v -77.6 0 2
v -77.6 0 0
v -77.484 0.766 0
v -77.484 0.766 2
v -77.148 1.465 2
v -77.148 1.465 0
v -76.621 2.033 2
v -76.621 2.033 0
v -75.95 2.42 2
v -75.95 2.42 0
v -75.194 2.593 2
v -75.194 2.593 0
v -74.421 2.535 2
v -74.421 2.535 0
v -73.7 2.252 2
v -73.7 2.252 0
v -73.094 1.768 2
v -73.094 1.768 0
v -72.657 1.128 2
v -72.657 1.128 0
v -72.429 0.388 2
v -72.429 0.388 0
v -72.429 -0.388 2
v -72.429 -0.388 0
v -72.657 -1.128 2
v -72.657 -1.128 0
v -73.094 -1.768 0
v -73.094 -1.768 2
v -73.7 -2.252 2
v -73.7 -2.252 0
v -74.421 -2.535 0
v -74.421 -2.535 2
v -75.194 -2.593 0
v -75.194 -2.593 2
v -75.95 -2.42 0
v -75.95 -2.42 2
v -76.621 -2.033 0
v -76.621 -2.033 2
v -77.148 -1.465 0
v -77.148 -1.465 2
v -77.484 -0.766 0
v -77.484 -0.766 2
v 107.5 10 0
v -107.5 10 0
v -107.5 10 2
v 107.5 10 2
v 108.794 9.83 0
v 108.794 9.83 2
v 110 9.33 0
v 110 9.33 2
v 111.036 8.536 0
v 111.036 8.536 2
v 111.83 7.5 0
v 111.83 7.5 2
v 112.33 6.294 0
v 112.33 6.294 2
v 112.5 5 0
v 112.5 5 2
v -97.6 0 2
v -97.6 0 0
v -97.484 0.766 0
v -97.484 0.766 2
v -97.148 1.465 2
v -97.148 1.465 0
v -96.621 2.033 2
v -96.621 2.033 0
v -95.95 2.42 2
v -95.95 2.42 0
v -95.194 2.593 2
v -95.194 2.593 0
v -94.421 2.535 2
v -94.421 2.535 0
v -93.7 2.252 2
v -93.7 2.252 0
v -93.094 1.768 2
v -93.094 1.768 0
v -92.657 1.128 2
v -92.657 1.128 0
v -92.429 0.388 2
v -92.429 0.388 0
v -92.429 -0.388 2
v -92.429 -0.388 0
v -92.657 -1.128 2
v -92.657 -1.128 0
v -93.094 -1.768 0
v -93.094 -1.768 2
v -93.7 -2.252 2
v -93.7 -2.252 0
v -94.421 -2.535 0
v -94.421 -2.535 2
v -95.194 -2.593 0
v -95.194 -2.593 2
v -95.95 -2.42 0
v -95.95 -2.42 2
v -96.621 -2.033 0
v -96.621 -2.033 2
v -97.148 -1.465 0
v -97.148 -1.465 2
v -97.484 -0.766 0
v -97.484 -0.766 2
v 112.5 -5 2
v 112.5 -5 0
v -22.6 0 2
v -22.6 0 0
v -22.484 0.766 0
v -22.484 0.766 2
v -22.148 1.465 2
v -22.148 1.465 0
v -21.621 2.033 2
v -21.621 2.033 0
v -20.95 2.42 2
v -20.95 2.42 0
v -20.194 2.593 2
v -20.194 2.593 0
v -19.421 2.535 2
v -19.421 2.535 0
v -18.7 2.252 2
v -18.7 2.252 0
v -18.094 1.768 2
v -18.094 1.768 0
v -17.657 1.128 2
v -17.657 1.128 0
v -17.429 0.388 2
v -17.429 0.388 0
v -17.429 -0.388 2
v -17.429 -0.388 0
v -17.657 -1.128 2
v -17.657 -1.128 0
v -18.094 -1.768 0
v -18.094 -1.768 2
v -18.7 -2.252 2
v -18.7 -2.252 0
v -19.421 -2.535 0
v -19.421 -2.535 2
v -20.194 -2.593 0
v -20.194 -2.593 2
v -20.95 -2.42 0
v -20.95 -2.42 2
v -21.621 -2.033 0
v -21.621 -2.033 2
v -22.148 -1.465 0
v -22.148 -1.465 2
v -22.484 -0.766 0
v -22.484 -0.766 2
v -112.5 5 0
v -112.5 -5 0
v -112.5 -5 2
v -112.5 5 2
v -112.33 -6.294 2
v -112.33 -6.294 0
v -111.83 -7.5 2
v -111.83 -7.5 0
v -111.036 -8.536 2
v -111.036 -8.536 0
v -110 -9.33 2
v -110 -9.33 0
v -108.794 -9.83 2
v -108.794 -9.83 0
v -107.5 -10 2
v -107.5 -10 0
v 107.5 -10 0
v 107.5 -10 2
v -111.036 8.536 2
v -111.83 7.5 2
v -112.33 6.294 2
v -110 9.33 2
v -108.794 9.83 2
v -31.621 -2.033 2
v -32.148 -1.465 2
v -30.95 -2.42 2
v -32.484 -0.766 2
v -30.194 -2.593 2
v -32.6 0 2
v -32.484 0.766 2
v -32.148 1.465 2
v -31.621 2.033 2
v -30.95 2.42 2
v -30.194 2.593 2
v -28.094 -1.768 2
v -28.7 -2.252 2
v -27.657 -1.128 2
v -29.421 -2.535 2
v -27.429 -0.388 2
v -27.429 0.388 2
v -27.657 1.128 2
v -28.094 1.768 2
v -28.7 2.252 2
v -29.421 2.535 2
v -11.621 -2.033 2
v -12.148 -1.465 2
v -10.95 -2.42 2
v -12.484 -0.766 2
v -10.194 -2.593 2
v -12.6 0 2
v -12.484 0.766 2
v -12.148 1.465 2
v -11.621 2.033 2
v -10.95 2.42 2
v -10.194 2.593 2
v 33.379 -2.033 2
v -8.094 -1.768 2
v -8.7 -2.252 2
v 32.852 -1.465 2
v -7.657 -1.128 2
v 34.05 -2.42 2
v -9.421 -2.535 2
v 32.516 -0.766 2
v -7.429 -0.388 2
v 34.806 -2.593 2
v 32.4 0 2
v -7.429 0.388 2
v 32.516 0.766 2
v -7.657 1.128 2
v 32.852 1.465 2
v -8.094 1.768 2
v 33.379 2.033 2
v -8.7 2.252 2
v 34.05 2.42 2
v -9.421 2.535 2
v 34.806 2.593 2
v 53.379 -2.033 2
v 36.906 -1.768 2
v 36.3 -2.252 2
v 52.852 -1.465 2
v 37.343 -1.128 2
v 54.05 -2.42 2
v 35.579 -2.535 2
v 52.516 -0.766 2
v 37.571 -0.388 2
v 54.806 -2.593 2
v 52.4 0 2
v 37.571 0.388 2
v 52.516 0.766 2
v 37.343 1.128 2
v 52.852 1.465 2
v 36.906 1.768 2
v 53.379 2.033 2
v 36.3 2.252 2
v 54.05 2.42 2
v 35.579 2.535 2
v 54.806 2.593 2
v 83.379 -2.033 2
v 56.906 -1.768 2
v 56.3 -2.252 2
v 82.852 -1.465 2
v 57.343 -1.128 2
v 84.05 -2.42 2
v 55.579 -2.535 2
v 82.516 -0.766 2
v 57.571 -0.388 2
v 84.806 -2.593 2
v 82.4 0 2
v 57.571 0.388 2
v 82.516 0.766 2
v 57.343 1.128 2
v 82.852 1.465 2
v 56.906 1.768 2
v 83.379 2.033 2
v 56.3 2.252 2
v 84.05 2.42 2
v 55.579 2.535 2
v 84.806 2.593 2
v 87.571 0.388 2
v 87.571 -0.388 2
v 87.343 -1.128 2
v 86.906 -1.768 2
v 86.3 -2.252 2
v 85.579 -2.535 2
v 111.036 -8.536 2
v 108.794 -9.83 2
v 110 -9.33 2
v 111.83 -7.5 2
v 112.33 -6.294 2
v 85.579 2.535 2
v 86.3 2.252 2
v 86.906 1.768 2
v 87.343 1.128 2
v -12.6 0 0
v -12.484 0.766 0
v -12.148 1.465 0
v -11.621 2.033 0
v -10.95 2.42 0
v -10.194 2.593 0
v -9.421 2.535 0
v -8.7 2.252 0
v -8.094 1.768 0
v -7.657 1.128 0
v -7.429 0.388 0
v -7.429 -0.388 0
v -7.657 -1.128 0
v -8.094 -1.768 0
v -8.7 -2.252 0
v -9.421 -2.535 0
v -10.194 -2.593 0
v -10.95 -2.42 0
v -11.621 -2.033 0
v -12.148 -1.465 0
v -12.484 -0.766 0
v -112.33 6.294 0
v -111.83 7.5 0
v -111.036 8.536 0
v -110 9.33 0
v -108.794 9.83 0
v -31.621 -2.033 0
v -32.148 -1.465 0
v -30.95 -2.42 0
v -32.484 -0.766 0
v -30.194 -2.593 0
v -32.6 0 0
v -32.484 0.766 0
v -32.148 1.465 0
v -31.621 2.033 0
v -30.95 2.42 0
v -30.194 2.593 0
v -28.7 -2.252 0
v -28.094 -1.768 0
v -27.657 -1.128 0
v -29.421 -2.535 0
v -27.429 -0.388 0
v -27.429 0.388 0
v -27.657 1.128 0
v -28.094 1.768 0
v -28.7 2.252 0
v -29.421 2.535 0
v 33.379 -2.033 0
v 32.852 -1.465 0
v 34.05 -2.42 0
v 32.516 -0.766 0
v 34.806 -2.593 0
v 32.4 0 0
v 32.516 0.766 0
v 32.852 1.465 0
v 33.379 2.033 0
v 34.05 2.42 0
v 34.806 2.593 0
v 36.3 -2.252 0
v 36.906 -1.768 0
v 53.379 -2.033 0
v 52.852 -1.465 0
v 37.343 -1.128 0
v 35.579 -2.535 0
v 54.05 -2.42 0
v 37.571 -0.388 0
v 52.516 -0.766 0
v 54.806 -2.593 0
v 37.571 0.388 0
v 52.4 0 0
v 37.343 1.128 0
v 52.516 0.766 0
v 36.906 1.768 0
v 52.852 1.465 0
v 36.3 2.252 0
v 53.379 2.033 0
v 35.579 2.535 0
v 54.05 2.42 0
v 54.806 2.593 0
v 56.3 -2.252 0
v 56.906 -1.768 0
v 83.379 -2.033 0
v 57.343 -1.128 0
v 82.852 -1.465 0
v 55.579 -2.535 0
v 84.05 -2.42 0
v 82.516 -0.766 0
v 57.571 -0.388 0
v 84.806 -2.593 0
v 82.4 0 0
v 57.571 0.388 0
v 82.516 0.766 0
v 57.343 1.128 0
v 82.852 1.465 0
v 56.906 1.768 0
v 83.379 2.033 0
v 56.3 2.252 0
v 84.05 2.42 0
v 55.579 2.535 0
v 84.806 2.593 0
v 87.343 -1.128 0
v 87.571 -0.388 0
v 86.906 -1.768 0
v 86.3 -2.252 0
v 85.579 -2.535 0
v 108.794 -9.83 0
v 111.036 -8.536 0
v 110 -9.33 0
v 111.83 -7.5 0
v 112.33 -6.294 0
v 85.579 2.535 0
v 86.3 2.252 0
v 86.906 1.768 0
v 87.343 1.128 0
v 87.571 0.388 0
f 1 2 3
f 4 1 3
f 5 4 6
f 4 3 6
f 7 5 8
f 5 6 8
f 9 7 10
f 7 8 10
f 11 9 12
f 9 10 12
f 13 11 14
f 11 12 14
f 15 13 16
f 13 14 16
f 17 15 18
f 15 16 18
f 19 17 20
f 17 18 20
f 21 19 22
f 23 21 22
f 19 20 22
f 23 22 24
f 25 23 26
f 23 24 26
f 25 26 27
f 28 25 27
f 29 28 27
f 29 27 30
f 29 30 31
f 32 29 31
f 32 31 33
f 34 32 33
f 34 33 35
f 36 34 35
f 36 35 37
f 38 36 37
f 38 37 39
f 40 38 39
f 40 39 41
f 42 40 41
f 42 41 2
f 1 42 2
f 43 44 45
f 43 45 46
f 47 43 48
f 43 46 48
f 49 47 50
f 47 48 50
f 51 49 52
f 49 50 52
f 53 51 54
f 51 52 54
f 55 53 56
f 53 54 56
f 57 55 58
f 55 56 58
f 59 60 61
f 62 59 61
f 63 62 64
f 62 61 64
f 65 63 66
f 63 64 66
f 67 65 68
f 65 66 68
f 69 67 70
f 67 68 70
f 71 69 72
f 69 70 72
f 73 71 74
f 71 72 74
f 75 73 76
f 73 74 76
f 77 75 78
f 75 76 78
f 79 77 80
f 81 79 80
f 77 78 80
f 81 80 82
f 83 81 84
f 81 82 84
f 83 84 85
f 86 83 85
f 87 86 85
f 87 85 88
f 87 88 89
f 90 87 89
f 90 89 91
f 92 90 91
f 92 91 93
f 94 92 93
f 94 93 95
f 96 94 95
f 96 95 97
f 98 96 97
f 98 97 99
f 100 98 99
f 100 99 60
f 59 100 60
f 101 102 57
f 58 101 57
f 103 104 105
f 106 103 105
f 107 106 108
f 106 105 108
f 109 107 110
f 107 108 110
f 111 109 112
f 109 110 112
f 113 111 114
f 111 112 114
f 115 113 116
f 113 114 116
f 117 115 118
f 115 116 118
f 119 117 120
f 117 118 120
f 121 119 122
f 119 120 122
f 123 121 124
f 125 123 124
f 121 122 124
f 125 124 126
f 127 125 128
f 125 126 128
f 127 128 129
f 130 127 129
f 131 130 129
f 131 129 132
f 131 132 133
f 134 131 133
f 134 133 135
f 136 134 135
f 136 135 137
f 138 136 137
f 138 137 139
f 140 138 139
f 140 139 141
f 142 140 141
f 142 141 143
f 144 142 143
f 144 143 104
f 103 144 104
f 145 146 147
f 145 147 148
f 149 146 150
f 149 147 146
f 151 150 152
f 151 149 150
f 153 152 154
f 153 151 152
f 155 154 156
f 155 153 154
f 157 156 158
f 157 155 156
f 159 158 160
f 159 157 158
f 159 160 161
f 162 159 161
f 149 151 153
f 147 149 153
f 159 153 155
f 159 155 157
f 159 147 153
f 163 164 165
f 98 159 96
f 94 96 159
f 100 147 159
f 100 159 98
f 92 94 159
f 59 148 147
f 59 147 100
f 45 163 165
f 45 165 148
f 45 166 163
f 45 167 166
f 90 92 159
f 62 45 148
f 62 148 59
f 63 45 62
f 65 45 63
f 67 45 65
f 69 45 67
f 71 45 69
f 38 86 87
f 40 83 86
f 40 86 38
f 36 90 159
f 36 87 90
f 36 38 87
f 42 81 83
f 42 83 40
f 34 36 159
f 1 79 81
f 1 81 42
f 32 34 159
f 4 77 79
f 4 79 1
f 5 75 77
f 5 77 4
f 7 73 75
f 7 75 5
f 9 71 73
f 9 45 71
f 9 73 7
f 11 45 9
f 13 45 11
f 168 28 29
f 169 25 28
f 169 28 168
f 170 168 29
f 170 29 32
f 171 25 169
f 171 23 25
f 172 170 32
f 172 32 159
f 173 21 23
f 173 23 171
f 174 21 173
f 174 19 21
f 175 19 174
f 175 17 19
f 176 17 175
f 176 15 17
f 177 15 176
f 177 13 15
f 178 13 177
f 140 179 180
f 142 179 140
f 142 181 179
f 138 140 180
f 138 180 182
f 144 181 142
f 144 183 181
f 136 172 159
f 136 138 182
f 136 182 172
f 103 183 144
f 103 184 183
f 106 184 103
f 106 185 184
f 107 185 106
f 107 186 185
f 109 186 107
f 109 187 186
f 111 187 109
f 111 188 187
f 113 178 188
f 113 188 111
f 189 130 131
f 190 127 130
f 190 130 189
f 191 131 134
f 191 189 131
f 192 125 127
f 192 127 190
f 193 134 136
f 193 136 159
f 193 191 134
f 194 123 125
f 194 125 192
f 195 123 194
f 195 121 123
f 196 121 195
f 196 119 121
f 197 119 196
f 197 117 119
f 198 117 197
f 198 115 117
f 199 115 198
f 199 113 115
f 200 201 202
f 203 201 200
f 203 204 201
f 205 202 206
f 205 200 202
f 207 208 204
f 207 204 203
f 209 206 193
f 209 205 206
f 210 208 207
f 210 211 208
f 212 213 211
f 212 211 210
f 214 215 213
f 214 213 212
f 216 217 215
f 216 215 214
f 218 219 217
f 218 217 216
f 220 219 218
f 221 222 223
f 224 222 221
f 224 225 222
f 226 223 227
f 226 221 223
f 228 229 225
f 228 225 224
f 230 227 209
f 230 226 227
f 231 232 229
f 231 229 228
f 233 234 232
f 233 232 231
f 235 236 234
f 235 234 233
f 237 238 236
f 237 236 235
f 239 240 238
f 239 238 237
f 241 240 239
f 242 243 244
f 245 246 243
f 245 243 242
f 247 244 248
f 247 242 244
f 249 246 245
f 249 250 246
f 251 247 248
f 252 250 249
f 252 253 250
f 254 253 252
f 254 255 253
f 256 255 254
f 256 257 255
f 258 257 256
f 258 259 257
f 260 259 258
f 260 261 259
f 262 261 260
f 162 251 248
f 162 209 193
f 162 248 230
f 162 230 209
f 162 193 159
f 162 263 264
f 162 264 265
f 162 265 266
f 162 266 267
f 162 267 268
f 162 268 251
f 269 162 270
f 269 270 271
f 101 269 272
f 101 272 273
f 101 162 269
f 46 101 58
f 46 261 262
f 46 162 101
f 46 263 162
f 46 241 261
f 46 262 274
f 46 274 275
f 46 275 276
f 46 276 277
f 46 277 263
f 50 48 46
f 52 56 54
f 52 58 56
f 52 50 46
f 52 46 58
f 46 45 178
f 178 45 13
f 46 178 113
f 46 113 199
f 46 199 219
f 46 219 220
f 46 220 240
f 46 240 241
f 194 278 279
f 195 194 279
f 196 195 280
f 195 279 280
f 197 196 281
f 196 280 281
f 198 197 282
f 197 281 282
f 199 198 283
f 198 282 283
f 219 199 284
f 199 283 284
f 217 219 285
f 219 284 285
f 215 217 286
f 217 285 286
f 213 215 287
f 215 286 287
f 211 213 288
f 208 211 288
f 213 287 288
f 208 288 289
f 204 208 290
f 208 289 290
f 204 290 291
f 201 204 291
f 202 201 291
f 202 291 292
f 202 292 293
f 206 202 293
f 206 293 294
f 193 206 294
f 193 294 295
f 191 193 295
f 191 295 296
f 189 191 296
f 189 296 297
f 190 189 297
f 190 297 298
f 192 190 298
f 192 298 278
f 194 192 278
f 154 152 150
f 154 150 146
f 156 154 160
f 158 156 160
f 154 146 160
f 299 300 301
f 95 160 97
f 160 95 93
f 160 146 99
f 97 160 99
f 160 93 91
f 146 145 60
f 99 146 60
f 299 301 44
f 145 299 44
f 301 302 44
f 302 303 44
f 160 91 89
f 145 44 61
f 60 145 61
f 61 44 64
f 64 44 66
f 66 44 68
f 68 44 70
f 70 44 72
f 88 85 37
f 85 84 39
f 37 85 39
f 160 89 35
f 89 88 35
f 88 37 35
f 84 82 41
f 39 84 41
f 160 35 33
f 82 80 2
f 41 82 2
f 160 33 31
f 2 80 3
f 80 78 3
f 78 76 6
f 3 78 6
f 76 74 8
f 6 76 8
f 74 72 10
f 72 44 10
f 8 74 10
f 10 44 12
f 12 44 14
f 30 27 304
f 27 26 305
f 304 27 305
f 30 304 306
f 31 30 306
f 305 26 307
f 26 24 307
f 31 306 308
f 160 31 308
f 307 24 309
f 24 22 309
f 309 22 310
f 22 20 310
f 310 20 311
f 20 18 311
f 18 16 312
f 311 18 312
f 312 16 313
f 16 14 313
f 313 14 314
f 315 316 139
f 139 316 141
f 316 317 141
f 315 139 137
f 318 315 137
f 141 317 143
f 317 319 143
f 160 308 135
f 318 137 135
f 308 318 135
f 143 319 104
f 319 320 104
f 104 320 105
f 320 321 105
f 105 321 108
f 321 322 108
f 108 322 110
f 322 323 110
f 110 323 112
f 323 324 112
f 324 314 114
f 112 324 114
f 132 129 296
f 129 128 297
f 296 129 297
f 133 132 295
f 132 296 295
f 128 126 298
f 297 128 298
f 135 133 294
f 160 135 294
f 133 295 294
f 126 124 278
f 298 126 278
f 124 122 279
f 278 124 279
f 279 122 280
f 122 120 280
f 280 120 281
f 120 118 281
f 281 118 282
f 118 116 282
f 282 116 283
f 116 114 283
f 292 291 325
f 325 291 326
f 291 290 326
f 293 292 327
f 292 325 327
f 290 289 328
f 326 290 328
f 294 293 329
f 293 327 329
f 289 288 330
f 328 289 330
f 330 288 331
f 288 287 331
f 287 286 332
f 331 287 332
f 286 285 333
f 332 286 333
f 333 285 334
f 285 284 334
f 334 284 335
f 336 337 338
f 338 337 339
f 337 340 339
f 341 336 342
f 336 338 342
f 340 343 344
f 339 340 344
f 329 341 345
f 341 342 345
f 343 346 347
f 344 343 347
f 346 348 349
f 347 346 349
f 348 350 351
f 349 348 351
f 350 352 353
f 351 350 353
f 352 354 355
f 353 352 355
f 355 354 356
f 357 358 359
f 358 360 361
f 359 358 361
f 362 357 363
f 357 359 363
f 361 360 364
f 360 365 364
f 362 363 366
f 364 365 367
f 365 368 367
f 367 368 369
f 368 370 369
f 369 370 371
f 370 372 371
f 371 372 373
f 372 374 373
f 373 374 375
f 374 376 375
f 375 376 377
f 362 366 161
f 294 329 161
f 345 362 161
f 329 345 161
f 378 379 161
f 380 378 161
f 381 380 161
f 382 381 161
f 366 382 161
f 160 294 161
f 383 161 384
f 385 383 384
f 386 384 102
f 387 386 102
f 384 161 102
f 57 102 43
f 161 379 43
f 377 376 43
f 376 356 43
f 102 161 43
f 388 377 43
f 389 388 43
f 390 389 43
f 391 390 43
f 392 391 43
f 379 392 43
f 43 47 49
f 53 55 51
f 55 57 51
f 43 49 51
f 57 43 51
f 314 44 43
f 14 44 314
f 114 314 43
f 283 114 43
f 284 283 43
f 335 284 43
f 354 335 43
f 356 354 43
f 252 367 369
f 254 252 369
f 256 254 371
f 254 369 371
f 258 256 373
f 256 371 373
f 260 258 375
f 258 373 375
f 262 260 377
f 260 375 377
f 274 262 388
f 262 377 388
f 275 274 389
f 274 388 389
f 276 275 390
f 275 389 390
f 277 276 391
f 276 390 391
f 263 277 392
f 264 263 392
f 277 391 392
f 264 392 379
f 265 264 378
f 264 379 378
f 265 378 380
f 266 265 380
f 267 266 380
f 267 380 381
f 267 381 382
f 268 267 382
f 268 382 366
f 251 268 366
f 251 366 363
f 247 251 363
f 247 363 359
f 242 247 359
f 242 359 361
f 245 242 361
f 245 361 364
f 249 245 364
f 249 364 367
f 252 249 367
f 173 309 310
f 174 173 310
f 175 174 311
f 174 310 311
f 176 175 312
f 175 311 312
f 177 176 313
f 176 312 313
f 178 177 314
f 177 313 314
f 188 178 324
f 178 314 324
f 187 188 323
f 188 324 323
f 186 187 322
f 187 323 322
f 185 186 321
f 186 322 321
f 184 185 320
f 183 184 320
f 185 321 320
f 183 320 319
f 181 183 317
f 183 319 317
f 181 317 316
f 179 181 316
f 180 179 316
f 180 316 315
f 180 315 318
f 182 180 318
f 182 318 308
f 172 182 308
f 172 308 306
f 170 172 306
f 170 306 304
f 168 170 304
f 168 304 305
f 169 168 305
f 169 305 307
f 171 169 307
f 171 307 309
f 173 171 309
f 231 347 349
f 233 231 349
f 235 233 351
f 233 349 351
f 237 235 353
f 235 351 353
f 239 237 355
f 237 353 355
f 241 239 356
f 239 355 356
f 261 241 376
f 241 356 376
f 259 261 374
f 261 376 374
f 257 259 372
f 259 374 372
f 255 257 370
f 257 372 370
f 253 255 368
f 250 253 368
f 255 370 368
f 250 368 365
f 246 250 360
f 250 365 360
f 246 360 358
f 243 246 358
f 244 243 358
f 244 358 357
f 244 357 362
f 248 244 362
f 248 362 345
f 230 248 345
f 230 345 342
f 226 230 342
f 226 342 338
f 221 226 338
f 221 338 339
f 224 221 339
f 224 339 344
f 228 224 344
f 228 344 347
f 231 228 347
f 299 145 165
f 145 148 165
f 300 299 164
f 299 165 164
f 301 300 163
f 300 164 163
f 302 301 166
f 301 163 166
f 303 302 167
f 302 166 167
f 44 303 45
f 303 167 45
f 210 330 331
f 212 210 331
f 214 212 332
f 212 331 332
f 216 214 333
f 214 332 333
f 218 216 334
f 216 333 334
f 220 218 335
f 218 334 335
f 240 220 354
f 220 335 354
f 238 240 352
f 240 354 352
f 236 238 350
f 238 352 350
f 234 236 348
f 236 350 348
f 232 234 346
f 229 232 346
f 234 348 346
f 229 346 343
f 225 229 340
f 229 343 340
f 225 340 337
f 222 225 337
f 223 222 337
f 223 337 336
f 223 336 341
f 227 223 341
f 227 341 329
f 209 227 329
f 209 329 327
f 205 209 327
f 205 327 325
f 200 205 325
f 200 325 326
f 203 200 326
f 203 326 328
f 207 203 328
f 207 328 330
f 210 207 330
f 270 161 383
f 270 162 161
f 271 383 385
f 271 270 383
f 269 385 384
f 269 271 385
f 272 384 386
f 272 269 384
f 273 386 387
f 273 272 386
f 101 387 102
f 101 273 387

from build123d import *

# Parameters (mm, degrees)
SKETCH_1_W          = 225
SKETCH_1_H          = 20
EXTRUDE_1_DEPTH     = 2
SKETCH_2_R          = 2.6
CUT_EXTRUDE_1_DEPTH = 113.961276551
FILLET_1_R          = 5


with BuildPart() as part:
    # 草图1 → 凸台-拉伸1 (new body)
    with BuildSketch(Plane.XY):
        Rectangle(SKETCH_1_W, SKETCH_1_H)
    extrude(amount=EXTRUDE_1_DEPTH)

    # 草图2 → 切除-拉伸1 (cut, through all)
    with BuildSketch(Plane(origin=(0, 0, 0), x_dir=(-1, 0, 0), z_dir=(0, 0, -1))):
        with Locations((95, 0)):
            Circle(SKETCH_2_R)
        with Locations((75, 0)):
            Circle(SKETCH_2_R)
        with Locations((30, 0)):
            Circle(SKETCH_2_R)
        with Locations((20, 0)):
            Circle(SKETCH_2_R)
        with Locations((10, 0)):
            Circle(SKETCH_2_R)
        with Locations((-35, 0)):
            Circle(SKETCH_2_R)
        with Locations((-55, 0)):
            Circle(SKETCH_2_R)
        with Locations((-85, 0)):
            Circle(SKETCH_2_R)
    extrude(amount=-CUT_EXTRUDE_1_DEPTH, mode=Mode.SUBTRACT)

    # 圆角1
    fillet_1_edges = [part.edges().sort_by_distance(p)[0] for p in [
        (112.5, -10, 1),
        (-112.5, -10, 1),
        (-112.5, 10, 1),
        (112.5, 10, 1),
    ]]
    fillet(fillet_1_edges, radius=FILLET_1_R)


solid = part.part
